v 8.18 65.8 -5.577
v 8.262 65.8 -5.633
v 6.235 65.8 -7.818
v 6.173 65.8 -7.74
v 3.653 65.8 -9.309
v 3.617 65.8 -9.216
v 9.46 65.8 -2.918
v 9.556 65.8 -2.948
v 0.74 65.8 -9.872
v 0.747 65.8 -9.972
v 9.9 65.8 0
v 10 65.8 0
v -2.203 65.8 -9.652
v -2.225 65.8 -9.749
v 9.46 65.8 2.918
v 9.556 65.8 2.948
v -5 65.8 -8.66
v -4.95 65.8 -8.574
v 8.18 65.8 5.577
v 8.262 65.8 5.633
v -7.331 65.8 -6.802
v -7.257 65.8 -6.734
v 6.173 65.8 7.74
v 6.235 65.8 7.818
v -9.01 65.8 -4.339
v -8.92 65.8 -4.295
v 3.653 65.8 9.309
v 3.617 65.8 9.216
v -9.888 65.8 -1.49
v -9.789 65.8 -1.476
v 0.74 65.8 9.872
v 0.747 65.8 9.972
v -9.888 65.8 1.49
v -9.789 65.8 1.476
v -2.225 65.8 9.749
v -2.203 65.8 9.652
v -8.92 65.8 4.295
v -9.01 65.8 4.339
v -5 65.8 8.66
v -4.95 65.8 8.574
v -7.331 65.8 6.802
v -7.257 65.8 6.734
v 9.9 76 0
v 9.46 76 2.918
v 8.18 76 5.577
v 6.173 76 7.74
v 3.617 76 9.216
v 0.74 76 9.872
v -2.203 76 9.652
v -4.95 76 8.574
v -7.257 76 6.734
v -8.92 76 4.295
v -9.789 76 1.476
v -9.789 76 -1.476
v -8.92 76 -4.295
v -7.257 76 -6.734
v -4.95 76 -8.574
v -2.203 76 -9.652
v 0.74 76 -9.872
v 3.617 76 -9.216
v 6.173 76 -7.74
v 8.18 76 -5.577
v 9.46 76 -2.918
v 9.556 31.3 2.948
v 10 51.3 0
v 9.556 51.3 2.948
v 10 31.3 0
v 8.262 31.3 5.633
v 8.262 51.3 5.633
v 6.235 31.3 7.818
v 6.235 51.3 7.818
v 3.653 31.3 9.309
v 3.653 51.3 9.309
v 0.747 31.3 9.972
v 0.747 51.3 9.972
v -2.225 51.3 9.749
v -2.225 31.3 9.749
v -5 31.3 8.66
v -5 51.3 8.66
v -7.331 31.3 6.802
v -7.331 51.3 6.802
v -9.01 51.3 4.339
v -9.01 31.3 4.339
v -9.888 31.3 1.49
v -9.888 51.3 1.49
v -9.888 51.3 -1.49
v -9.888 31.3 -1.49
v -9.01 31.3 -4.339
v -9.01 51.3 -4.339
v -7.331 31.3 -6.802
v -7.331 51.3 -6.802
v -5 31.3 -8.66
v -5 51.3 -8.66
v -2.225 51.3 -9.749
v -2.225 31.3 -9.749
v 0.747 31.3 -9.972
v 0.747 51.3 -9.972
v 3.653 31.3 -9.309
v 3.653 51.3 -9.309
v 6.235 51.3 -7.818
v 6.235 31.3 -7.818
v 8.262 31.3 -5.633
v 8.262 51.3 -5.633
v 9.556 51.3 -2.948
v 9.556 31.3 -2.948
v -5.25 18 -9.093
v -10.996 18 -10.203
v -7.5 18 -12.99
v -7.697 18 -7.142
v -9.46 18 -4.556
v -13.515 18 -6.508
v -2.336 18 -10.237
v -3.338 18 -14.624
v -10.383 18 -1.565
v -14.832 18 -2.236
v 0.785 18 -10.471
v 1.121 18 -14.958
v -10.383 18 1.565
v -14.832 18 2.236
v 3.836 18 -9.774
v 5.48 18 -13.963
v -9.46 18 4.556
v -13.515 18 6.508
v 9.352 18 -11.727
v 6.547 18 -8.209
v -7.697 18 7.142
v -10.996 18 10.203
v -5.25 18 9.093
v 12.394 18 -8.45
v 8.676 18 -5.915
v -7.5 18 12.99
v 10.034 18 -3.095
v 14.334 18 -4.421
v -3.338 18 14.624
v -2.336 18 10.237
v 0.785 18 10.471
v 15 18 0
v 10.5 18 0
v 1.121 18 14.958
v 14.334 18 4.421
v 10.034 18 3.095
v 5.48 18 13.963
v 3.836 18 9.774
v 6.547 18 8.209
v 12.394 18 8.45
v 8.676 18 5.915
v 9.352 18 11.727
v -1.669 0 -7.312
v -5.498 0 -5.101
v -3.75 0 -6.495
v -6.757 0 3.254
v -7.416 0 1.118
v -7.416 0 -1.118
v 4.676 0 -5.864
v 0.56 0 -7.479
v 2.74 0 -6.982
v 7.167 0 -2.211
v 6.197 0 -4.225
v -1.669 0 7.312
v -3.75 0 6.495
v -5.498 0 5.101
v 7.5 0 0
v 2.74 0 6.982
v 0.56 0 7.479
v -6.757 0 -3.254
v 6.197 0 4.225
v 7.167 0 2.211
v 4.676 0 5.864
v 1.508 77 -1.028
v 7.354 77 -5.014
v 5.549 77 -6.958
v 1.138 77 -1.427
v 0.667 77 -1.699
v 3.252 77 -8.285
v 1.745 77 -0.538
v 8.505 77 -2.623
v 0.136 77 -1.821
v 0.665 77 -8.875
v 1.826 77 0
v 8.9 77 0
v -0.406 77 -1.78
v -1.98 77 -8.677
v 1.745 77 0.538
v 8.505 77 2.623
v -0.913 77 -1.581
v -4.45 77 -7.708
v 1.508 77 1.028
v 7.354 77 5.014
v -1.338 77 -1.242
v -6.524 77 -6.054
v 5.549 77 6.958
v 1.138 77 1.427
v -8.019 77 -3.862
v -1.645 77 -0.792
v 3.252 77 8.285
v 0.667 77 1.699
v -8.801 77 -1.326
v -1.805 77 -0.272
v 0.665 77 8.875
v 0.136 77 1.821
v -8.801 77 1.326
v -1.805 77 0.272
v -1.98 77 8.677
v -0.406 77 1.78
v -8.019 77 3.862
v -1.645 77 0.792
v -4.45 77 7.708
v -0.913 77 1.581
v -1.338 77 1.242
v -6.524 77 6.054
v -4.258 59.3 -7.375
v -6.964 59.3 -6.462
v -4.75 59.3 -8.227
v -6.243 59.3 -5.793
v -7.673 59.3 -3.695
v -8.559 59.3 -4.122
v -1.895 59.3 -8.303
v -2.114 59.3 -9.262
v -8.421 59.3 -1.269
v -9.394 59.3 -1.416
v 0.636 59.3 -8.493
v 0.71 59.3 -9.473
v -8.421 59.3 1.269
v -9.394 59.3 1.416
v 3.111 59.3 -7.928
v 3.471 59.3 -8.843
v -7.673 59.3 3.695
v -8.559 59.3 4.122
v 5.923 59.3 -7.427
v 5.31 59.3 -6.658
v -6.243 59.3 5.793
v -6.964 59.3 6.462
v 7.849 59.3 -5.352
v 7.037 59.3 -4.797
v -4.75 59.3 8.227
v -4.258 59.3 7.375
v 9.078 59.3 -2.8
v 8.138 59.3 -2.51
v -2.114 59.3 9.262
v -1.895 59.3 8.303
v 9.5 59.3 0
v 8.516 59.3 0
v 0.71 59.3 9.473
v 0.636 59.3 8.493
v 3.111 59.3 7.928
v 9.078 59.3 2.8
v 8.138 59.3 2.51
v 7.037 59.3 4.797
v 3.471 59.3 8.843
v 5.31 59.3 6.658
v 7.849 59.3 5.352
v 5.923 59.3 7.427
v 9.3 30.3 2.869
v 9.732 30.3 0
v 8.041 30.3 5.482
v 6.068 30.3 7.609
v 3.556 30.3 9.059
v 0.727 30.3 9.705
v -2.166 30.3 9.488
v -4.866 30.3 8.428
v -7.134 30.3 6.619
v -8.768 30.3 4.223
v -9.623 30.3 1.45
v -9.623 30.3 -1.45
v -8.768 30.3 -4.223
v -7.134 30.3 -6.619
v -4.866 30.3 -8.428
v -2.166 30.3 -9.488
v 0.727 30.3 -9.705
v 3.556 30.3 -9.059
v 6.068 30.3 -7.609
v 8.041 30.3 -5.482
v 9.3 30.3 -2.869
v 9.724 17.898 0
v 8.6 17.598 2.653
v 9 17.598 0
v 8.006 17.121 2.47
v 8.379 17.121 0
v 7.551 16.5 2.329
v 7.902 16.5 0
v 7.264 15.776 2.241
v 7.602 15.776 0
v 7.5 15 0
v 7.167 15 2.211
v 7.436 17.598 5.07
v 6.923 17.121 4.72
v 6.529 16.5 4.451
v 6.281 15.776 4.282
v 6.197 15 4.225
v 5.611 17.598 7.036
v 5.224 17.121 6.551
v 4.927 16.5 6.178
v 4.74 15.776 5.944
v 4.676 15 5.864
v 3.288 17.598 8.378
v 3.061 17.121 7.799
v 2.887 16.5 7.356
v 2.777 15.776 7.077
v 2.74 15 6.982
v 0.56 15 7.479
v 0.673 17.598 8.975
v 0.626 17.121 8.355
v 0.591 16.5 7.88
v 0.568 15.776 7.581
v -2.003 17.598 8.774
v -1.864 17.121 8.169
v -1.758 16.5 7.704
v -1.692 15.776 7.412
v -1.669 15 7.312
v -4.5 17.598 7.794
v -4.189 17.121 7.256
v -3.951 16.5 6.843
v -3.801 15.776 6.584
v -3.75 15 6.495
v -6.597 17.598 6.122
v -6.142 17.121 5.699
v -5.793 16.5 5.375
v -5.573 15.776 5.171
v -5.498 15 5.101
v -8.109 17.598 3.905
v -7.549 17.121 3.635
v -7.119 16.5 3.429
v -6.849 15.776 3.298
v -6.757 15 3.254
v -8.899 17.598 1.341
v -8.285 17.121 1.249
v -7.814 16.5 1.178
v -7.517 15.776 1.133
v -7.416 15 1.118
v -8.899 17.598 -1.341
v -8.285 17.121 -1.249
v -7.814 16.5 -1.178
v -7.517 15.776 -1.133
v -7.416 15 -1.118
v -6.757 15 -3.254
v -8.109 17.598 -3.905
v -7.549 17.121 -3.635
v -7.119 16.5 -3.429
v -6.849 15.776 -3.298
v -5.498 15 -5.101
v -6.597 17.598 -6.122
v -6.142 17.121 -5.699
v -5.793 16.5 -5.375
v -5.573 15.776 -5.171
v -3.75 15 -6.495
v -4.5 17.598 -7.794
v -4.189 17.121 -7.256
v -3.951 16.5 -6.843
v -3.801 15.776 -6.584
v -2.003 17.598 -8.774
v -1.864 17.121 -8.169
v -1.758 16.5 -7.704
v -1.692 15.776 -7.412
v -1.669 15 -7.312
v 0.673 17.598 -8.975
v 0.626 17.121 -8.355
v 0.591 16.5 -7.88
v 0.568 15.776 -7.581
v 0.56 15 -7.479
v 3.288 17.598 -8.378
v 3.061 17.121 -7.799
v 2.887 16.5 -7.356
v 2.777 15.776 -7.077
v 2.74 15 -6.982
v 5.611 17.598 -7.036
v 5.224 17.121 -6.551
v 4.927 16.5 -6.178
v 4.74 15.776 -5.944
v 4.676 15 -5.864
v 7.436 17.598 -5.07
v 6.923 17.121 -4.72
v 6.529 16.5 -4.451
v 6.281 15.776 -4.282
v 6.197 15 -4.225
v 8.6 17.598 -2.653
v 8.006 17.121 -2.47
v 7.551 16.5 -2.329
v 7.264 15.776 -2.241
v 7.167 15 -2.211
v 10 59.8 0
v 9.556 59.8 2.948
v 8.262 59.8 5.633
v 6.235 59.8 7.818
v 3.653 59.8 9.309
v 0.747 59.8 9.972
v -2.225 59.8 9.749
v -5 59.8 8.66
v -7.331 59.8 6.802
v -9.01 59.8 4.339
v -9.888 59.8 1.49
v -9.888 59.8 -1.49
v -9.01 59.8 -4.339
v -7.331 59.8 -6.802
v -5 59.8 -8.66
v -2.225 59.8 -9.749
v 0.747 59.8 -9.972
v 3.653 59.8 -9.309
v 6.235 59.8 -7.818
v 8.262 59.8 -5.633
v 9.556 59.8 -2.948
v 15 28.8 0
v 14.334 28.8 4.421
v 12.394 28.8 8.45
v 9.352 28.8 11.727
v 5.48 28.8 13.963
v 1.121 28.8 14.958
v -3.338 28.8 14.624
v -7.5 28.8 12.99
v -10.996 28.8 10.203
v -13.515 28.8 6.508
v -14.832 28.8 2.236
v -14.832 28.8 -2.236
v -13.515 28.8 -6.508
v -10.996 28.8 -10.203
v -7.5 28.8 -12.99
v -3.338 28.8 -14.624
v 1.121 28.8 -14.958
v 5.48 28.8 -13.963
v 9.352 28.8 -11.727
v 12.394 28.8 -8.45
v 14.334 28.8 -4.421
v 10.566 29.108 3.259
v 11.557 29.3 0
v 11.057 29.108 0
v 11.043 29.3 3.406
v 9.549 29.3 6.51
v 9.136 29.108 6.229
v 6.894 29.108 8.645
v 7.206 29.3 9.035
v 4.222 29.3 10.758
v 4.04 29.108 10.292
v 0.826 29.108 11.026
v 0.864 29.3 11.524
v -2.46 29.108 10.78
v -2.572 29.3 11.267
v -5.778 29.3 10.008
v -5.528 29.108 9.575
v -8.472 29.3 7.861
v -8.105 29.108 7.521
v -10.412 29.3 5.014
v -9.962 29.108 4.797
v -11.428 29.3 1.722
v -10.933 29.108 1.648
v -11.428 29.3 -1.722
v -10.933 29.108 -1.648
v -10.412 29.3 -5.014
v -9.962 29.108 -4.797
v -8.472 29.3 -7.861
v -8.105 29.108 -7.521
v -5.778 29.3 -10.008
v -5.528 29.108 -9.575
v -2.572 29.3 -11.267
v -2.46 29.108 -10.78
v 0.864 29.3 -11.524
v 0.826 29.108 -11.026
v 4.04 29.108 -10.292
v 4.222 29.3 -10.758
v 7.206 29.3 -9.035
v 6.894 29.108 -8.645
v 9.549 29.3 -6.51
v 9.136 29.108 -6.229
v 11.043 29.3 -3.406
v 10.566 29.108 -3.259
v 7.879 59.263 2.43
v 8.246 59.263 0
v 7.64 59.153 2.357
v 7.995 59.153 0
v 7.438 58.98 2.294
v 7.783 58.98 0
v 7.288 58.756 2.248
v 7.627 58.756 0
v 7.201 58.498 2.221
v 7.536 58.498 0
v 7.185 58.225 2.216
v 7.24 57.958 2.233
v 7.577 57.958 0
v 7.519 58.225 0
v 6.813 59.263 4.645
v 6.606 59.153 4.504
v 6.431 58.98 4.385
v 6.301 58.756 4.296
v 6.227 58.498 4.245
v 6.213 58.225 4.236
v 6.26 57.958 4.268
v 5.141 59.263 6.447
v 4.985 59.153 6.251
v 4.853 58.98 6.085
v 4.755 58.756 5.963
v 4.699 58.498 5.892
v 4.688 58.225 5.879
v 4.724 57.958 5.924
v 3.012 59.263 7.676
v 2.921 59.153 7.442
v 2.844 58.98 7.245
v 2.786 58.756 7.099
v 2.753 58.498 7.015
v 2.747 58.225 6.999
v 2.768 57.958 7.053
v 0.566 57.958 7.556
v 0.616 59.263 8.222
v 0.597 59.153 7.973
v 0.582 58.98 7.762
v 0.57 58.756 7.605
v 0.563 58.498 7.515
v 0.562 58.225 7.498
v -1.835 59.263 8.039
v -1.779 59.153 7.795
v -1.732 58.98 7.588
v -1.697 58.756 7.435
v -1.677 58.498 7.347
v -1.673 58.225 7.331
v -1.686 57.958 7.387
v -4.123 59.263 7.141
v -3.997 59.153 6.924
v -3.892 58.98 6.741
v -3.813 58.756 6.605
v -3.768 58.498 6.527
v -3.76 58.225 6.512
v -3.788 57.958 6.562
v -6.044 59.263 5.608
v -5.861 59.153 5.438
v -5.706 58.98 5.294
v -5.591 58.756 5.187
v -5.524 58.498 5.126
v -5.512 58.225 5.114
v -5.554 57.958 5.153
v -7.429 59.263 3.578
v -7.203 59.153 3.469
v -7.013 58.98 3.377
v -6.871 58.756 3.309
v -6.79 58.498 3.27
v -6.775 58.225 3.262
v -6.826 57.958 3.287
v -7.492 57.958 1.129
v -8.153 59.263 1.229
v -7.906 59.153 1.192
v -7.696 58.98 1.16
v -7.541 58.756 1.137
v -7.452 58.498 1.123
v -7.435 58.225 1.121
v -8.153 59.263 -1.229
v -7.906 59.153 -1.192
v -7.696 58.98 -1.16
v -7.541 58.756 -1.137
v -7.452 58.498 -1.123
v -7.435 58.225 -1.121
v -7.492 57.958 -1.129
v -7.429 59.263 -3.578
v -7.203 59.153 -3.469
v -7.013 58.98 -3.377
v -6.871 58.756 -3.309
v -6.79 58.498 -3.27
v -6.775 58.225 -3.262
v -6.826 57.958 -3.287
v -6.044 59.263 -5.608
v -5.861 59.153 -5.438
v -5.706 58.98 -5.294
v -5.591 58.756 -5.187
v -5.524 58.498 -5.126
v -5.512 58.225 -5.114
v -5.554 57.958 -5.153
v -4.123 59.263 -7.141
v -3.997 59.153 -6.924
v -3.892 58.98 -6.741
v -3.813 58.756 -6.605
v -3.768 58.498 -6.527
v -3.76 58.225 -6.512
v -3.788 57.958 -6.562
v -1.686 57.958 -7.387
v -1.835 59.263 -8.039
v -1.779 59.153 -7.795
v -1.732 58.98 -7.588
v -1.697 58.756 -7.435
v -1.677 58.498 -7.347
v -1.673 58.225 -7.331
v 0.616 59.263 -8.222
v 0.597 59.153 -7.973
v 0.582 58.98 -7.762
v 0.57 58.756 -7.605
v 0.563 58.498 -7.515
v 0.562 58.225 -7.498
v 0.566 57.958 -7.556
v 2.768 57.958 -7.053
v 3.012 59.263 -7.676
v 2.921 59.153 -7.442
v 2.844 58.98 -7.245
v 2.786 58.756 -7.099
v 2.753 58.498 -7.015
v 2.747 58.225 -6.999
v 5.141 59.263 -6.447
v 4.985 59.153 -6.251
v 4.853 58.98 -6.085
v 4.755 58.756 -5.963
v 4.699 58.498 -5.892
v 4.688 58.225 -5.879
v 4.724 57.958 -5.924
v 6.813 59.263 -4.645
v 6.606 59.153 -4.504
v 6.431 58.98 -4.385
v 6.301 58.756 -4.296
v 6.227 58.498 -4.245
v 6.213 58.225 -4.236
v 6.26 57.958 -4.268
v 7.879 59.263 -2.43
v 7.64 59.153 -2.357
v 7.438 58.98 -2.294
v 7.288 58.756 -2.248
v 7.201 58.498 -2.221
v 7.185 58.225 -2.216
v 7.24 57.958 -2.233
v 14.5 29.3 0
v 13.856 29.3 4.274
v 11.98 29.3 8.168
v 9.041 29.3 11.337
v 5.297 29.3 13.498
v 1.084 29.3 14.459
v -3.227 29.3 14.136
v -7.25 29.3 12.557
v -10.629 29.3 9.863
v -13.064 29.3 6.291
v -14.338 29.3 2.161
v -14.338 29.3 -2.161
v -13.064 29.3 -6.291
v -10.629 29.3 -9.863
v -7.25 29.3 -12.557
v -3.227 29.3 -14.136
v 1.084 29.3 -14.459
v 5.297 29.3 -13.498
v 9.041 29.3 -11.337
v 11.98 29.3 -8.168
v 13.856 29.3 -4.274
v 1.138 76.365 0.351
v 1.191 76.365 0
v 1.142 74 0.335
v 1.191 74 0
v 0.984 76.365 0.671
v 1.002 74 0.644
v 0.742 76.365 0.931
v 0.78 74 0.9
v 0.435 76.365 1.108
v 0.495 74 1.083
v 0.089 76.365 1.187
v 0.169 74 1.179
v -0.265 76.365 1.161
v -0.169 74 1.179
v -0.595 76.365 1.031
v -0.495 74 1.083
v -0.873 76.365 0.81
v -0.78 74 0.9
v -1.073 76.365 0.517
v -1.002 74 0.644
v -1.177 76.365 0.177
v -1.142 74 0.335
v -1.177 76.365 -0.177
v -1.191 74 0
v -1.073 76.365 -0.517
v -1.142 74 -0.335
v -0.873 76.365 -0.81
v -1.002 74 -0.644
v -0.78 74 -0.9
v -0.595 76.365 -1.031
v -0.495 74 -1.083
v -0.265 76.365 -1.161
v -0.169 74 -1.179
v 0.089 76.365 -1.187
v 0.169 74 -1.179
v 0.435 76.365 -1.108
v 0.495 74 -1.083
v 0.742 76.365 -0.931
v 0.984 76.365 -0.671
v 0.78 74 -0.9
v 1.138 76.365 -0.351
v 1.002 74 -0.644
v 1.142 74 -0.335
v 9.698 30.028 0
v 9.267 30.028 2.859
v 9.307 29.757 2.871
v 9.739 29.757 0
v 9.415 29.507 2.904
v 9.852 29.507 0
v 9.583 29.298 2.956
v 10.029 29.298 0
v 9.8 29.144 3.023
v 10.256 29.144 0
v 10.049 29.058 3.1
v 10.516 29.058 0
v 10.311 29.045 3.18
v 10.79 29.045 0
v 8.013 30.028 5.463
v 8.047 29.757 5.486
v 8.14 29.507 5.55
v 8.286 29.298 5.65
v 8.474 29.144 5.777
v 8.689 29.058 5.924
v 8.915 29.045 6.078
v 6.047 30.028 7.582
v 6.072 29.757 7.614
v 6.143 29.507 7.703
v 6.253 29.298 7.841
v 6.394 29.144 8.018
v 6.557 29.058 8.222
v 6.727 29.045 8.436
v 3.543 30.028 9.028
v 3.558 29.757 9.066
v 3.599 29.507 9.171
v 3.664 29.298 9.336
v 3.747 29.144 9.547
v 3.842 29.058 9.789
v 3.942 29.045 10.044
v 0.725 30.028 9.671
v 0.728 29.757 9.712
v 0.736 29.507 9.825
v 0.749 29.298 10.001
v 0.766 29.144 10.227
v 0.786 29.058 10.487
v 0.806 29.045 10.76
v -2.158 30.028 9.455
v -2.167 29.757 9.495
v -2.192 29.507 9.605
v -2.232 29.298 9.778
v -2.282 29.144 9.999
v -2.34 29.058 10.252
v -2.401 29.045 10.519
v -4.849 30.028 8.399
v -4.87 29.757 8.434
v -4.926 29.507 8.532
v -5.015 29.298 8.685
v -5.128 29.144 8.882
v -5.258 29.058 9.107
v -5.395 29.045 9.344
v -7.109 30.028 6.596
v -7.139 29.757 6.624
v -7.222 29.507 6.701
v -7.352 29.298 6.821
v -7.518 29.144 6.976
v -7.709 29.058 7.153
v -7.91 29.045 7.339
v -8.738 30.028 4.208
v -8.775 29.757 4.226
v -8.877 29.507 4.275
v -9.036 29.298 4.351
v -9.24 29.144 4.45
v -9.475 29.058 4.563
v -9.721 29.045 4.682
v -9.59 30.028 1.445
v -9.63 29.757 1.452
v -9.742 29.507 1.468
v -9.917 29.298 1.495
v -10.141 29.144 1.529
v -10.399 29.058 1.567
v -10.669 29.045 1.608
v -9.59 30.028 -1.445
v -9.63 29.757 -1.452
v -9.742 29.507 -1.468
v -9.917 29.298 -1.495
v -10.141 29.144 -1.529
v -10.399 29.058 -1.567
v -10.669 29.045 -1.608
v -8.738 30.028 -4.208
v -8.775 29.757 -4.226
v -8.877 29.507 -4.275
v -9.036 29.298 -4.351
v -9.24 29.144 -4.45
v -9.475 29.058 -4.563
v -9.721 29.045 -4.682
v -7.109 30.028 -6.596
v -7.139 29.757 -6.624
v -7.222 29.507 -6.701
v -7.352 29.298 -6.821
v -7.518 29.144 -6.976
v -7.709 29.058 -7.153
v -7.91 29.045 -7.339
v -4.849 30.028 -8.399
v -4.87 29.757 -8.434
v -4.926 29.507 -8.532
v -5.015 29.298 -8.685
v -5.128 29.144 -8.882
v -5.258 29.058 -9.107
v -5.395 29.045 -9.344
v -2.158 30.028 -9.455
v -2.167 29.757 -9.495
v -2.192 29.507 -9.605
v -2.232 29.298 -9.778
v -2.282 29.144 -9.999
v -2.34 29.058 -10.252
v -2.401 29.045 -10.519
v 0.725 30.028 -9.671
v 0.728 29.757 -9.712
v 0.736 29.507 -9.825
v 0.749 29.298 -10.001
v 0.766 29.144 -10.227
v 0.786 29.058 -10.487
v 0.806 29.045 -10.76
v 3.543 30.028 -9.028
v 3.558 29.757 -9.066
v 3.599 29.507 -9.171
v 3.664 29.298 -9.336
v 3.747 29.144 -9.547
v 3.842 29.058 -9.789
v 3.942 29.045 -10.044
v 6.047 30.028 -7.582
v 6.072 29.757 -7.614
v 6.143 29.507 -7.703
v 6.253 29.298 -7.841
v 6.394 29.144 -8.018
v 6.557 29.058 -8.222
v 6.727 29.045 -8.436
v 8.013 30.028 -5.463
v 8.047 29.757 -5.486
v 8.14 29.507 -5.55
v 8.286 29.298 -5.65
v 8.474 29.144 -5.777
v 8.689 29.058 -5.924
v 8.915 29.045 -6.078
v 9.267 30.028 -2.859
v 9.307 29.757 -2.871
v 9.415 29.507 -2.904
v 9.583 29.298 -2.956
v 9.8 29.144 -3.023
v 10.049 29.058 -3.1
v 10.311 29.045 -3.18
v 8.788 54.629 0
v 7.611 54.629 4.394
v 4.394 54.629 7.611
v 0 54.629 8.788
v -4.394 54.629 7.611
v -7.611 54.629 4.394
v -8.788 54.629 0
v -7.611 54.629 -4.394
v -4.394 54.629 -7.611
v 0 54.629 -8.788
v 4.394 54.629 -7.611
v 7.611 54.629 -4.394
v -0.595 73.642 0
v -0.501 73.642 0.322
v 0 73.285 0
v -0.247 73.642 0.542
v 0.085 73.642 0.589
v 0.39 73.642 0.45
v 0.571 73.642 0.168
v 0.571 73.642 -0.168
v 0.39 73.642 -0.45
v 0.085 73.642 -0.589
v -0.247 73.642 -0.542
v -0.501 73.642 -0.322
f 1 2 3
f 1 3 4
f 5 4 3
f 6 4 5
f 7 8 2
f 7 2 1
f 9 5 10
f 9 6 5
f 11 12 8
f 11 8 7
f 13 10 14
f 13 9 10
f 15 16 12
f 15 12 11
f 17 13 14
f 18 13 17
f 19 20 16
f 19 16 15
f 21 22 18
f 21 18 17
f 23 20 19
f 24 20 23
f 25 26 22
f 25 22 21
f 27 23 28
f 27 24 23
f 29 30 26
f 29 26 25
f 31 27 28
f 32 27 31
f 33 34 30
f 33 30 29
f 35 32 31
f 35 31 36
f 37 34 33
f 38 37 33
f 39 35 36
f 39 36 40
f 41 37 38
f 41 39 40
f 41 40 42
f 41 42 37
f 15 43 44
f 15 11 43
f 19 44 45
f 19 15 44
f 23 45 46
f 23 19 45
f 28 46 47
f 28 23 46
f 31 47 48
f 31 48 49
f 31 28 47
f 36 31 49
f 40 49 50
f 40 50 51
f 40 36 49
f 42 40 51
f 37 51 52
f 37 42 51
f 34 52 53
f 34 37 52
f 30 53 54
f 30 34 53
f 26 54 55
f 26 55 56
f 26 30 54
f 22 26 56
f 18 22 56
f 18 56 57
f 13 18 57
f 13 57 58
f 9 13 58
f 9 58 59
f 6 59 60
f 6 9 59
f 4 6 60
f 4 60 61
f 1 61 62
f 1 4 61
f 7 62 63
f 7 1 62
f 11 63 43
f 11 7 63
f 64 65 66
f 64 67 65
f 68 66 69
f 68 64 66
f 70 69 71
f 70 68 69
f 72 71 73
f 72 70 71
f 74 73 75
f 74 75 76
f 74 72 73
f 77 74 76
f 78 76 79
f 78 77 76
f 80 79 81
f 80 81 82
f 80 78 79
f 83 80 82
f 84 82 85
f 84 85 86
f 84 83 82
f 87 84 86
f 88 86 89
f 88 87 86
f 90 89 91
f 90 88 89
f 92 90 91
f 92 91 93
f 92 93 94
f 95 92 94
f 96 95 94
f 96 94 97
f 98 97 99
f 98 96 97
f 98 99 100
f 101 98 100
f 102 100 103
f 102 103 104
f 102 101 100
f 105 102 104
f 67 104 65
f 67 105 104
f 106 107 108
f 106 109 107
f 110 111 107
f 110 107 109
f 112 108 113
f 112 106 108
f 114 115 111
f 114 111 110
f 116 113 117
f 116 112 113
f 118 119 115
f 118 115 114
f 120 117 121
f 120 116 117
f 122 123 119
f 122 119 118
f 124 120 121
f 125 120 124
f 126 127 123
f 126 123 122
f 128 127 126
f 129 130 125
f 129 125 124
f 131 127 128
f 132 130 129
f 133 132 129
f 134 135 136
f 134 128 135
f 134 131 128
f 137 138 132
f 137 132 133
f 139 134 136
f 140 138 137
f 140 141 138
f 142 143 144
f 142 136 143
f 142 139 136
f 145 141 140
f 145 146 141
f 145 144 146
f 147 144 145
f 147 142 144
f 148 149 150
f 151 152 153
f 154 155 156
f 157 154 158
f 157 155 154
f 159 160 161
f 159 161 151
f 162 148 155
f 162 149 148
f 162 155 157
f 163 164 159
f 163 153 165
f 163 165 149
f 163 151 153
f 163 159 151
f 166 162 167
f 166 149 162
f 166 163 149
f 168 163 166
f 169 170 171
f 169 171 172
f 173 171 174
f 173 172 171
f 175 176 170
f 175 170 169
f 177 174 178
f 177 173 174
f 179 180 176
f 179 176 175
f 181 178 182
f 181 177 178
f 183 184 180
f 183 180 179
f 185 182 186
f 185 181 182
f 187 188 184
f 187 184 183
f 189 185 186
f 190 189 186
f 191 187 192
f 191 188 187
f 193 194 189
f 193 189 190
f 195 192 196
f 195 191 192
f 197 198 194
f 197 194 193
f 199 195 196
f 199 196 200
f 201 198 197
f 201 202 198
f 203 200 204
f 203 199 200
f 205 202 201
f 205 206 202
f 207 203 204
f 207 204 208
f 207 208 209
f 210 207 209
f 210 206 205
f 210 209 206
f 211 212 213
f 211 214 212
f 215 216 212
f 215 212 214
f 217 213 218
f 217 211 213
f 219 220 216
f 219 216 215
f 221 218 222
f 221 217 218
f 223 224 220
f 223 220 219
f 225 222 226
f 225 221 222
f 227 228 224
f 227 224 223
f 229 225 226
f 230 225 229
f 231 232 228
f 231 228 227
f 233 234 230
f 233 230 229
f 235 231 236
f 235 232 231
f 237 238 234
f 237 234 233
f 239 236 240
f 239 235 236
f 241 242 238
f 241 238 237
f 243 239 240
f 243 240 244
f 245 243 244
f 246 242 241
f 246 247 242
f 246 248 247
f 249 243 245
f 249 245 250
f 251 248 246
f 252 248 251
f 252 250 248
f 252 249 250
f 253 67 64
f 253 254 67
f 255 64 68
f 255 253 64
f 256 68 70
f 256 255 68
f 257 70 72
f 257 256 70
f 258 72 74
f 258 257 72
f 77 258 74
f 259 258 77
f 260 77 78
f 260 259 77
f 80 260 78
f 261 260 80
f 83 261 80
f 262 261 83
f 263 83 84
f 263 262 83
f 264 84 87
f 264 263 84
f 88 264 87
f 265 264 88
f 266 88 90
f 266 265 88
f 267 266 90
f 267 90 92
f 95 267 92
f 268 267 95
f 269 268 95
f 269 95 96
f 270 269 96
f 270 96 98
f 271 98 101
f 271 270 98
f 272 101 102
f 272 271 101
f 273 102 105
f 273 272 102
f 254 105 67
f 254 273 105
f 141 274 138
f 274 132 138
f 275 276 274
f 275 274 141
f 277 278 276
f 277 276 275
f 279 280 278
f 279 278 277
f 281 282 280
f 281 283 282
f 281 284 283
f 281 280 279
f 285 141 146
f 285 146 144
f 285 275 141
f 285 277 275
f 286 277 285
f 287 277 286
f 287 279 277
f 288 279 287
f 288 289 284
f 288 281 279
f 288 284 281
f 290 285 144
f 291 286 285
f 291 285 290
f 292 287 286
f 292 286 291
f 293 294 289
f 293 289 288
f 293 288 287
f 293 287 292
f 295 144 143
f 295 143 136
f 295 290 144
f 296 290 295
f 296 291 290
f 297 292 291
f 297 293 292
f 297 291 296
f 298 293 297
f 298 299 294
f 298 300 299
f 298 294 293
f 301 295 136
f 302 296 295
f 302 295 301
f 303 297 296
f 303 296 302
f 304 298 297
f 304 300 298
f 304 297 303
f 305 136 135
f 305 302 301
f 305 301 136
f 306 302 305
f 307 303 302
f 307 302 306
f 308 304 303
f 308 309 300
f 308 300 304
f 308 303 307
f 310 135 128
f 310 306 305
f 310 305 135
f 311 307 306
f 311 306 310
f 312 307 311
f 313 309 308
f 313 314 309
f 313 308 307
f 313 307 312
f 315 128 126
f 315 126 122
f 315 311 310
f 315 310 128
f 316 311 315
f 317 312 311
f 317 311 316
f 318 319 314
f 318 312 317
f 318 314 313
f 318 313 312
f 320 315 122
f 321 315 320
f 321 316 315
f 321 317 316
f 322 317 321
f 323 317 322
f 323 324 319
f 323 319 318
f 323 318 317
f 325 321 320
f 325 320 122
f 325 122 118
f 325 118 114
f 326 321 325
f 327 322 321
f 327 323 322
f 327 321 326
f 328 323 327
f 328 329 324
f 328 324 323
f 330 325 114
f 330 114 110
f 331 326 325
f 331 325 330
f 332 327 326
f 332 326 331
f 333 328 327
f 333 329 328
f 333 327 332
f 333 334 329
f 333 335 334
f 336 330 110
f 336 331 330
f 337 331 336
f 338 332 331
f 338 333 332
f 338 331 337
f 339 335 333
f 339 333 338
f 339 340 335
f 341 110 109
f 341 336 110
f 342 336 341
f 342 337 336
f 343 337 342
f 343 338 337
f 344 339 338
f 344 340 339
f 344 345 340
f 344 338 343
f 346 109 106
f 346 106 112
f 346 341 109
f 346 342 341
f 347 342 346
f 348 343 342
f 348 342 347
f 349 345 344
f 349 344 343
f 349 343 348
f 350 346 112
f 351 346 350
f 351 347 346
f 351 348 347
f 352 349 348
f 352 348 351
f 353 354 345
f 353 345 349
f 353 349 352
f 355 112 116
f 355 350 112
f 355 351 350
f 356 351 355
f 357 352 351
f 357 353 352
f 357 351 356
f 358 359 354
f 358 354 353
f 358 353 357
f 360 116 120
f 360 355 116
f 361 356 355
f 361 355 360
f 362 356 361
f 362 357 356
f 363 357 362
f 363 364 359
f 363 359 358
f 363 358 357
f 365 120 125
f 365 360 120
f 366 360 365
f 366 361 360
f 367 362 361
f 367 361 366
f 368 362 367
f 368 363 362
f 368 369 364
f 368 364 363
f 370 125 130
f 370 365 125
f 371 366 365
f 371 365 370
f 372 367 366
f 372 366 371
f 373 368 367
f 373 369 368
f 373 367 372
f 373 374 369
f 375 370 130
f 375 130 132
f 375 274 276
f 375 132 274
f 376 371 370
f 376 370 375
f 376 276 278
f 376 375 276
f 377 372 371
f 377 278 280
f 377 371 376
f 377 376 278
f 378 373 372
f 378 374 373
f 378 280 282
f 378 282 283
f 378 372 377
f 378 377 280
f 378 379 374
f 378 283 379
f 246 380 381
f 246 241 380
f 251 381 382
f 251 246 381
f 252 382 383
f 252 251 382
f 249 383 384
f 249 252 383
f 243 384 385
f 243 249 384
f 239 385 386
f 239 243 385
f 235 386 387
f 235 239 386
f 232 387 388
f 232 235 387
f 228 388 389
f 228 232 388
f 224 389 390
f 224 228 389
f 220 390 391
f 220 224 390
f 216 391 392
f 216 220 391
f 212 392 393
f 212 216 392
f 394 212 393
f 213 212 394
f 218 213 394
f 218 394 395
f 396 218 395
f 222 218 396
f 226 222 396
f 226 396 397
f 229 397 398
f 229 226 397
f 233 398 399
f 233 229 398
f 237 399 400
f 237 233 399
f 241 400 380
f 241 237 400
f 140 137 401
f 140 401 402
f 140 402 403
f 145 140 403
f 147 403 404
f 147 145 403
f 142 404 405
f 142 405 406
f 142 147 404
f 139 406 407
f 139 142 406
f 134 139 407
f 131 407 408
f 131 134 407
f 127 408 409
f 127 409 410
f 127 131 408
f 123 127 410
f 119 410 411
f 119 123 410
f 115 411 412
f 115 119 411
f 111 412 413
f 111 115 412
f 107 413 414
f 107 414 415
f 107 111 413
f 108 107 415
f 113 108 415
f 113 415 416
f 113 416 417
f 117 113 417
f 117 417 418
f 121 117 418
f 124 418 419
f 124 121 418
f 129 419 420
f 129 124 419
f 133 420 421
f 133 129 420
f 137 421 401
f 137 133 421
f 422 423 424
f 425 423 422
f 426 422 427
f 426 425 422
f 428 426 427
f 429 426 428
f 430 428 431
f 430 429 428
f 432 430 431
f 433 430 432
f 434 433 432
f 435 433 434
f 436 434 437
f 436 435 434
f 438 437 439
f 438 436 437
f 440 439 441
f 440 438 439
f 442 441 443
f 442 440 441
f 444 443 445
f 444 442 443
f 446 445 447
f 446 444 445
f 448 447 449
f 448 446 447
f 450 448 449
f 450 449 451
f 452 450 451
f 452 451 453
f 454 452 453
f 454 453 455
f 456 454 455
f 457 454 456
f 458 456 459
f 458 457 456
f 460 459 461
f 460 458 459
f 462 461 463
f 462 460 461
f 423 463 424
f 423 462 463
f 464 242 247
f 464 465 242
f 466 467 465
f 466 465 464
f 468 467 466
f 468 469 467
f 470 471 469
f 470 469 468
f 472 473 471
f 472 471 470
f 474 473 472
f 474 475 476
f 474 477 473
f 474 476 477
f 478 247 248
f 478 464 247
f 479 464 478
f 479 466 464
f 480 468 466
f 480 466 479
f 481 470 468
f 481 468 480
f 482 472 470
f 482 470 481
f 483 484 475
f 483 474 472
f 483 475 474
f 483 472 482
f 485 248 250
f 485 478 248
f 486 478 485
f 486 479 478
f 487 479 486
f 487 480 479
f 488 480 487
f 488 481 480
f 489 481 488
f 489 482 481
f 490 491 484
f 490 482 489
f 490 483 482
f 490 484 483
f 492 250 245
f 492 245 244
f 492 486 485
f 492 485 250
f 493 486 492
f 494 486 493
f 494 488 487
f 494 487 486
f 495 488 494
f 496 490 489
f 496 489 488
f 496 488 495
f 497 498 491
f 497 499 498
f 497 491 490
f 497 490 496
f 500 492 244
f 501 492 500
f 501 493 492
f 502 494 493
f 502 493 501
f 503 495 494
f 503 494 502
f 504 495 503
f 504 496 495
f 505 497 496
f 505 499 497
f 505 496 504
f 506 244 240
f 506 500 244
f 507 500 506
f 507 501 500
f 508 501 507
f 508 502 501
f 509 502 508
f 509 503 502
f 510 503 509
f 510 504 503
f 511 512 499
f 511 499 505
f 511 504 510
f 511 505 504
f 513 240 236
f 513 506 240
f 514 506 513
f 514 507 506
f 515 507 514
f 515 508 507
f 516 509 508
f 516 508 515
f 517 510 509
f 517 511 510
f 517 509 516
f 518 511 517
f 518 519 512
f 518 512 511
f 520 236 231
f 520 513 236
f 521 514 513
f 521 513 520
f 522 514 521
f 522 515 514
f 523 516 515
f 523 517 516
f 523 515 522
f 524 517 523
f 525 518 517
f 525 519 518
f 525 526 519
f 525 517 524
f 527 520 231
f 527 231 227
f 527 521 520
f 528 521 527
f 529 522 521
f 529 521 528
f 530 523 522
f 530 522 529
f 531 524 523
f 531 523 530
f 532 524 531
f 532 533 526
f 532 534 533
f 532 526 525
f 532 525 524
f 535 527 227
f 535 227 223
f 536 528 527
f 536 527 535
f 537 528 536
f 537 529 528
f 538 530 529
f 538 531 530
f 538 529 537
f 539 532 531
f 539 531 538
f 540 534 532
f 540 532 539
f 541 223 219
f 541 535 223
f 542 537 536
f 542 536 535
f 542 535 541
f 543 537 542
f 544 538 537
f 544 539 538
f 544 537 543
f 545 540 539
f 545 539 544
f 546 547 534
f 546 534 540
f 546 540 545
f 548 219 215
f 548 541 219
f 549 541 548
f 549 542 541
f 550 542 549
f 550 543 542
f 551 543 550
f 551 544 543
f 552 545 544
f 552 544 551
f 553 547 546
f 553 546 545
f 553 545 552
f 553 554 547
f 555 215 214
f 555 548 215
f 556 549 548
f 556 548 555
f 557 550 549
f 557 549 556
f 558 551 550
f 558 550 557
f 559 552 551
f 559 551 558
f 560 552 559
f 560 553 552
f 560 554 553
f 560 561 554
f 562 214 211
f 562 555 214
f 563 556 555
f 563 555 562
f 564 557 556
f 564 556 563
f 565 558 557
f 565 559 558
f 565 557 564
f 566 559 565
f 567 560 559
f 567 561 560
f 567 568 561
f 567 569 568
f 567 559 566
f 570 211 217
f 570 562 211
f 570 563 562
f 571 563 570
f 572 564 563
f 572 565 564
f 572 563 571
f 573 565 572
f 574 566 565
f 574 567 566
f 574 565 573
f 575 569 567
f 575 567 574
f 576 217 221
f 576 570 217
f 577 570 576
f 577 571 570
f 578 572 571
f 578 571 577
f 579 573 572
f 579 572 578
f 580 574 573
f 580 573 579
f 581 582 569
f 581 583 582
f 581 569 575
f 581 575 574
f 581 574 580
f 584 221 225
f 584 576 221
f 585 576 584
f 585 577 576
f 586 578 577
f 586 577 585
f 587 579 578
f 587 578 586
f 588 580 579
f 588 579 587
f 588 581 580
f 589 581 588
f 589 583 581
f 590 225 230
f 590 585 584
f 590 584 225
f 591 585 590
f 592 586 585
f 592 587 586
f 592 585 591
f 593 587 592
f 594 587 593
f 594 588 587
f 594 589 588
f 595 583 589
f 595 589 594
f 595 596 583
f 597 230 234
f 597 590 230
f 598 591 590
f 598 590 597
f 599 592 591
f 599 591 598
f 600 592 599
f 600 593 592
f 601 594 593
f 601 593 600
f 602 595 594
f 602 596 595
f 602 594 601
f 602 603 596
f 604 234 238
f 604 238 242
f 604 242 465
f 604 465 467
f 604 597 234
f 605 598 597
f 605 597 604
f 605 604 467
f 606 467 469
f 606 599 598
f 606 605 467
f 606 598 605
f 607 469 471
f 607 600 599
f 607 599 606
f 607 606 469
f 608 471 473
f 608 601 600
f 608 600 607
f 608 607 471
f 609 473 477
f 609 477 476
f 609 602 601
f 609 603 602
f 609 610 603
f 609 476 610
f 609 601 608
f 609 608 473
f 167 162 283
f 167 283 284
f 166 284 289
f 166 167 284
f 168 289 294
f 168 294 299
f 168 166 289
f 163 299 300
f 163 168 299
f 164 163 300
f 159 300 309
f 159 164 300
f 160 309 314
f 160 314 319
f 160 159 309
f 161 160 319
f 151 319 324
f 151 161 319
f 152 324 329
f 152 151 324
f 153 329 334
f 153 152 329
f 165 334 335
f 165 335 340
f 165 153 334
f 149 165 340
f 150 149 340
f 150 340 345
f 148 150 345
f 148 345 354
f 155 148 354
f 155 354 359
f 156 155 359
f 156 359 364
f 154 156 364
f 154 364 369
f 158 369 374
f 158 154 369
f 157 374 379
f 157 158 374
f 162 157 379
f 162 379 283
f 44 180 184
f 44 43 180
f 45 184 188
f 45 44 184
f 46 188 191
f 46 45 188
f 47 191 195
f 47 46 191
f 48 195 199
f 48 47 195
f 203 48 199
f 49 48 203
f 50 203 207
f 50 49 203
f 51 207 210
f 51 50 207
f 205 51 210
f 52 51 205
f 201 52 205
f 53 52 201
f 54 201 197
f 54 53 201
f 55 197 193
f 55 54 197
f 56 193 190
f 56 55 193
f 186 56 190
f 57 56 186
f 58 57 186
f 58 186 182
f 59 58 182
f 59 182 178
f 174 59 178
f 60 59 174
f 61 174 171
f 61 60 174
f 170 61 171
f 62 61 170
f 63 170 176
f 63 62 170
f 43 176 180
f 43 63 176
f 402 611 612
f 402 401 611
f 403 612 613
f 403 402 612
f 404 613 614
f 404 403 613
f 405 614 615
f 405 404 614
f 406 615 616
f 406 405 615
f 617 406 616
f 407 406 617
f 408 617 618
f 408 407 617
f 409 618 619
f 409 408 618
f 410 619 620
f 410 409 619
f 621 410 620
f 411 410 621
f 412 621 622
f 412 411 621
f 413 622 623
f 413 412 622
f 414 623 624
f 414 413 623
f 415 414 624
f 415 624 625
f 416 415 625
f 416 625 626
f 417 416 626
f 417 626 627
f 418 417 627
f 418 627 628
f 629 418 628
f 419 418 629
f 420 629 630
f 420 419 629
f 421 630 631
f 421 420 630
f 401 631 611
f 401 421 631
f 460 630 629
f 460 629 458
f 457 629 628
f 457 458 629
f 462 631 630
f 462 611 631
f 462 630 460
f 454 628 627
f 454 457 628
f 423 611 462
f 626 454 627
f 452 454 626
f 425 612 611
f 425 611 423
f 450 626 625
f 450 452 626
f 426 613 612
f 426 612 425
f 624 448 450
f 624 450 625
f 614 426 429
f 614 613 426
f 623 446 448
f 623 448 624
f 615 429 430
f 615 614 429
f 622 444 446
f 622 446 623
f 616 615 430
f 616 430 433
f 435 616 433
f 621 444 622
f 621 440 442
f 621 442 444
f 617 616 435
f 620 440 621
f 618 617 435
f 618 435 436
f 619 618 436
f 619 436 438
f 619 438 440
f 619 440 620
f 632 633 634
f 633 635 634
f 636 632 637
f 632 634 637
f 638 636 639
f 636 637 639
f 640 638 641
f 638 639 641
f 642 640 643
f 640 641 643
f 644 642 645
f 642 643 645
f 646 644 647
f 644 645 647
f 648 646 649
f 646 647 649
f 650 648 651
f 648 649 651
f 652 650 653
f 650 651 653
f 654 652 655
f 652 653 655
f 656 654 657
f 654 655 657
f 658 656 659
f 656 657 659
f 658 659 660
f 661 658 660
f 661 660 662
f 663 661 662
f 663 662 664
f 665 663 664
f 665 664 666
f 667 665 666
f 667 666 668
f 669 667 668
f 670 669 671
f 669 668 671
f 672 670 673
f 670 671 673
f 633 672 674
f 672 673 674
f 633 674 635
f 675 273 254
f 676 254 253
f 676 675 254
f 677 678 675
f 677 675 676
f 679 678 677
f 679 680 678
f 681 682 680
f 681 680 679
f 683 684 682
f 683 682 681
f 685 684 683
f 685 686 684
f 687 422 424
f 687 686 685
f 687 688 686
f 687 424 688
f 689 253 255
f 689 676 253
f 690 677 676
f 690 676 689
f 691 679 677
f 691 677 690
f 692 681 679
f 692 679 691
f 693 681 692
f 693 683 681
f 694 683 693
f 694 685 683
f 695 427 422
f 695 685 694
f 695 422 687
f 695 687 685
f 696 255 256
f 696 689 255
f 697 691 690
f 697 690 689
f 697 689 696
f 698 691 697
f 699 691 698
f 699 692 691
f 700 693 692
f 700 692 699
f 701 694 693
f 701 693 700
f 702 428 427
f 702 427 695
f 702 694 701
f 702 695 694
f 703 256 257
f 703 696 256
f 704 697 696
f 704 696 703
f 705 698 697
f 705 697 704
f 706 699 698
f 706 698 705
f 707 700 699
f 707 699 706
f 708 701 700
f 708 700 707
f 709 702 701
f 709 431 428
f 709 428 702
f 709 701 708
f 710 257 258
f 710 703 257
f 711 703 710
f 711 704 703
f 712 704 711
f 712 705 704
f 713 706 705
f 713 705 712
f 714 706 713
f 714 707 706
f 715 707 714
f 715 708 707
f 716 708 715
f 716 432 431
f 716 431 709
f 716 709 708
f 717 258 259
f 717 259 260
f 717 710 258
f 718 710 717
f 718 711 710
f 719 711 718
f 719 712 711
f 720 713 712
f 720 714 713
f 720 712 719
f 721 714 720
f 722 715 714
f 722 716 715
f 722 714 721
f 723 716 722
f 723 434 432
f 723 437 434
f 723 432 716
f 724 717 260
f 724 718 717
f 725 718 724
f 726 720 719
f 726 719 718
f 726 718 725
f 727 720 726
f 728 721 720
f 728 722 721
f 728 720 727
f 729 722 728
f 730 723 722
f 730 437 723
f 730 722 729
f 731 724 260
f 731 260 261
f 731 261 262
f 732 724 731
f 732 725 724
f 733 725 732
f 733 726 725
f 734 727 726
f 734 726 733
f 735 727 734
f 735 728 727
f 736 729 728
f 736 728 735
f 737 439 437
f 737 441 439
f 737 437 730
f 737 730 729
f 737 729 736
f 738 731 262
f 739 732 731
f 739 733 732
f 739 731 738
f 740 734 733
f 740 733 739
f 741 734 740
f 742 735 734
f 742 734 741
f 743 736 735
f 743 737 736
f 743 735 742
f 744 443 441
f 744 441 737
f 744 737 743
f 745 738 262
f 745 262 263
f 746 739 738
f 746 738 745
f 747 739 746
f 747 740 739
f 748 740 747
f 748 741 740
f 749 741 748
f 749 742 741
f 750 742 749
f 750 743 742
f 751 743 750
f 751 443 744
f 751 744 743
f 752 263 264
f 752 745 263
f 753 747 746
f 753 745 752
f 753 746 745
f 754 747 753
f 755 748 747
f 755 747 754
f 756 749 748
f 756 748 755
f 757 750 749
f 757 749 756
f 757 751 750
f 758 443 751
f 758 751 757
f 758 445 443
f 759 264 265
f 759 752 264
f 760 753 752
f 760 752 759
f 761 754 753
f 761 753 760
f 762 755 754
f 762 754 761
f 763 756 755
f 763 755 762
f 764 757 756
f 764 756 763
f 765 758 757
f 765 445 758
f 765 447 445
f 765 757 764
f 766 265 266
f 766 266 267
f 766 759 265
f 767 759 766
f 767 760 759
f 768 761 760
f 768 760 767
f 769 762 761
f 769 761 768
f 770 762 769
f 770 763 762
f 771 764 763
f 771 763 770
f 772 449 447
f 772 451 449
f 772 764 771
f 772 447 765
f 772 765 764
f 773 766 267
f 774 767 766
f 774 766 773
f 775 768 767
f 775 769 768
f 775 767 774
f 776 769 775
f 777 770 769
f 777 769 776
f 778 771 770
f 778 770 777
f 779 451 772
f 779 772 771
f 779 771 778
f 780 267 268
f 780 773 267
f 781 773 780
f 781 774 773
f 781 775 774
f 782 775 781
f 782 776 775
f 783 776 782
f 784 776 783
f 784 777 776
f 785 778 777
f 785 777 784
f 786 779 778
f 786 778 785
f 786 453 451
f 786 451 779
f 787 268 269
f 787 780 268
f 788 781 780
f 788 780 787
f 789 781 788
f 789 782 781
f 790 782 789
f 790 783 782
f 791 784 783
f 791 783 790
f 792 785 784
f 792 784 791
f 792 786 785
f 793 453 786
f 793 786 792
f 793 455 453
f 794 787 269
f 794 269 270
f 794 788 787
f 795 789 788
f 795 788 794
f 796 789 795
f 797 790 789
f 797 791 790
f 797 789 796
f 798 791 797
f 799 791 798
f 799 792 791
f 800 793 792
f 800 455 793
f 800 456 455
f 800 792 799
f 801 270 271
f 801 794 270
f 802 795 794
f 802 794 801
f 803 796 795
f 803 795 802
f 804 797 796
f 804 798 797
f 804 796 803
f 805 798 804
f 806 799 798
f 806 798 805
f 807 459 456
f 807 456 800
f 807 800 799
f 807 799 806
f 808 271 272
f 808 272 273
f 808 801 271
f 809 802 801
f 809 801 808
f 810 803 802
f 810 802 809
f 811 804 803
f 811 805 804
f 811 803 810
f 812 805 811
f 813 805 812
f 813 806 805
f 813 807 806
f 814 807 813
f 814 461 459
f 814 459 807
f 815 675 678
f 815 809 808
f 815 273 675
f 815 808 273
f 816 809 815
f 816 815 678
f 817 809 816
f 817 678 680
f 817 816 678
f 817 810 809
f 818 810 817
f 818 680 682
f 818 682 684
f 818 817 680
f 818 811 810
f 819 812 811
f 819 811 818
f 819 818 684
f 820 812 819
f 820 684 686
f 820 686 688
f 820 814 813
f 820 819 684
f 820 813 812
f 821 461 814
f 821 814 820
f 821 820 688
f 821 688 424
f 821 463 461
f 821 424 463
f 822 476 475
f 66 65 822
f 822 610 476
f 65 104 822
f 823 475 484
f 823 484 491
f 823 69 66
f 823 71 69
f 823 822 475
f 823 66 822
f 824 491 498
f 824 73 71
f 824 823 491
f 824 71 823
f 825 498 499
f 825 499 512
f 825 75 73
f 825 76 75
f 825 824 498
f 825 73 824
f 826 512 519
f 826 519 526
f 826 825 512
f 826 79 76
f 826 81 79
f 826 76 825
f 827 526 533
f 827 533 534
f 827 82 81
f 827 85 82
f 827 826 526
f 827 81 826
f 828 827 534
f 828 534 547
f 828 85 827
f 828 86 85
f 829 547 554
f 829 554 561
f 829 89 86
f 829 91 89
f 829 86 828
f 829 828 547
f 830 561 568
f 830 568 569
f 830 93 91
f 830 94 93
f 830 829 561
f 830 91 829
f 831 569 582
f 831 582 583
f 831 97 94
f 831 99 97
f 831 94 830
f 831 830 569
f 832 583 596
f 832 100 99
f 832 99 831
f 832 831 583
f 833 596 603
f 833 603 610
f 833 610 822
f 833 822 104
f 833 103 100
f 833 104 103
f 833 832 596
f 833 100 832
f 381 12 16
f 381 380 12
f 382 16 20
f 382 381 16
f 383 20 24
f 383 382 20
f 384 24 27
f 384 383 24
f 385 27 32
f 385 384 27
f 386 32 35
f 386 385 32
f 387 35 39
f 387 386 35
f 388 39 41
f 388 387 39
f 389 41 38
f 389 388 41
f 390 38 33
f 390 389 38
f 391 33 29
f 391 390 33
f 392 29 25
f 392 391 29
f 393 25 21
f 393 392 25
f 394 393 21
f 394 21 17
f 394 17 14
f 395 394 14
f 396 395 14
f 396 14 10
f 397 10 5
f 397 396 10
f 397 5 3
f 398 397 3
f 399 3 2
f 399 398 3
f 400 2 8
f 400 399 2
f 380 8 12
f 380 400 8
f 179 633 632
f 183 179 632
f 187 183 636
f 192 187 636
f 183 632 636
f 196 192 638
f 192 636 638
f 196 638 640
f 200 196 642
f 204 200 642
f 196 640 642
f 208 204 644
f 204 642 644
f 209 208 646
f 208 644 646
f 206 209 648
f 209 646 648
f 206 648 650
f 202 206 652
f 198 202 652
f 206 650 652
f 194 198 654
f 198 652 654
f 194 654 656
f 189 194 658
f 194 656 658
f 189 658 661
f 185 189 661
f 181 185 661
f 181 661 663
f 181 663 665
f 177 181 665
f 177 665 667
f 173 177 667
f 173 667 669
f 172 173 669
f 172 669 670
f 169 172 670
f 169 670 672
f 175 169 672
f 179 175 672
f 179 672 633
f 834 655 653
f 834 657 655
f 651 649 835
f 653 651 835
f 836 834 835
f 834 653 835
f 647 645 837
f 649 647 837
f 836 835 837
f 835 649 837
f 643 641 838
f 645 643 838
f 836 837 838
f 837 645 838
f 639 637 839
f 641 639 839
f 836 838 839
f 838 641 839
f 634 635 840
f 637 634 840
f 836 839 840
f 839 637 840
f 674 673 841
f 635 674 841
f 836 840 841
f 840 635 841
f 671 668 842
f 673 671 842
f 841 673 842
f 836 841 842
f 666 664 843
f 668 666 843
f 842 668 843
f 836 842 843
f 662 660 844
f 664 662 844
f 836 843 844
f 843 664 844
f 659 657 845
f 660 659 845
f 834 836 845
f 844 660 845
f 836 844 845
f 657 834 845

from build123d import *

# Parameters (mm, degrees)
FURO_DE_DI_METRO_3_32_0_09375_2_D           = 2.38125
FURO_DE_DI_METRO_3_32_0_09375_2_DEPTH       = 3
FURO_DE_DI_METRO_3_32_0_09375_2_CSINK_D     = 3.65125
FURO_DE_DI_METRO_3_32_0_09375_2_CSINK_ANGLE = 90
FURO_DE_DI_METRO_3_32_0_09375_2_TIP         = 0.715399675
ESBO_O10_OUTSIDE_W                          = 49.582
ESBO_O10_OUTSIDE_H                          = 49.582
ESBO_O10_OUTSIDE_R                          = 7.5
CORTE_EXTRUS_O2_DEPTH                       = 18
FILETE1_R                                   = 3


with BuildPart() as part:
    # Esboço1 → Revolução1 (revolve)
    with BuildSketch(Plane.XY):
        with BuildLine():
            Line((0, 77), (8.9, 77))
            Line((8.9, 77), (9.9, 76))
            Line((9.9, 76), (9.9, 65.8))
            Line((9.9, 65.8), (10, 65.8))
            Line((10, 65.8), (10, 59.8))
            Line((10, 59.8), (9.5, 59.3))
            Line((9.5, 59.3), (8.516386133, 59.3))
            ThreePointArc((8.516386133, 59.3), (7.697234088, 58.873576436), (7.576693512, 57.957979857))
            Line((7.576693512, 57.957979857), (10, 51.3))
            Line((10, 51.3), (10, 31.3))
            Line((10, 31.3), (9.732050808, 30.3))
            ThreePointArc((9.732050808, 30.3), (10.029032337, 29.297868418), (11.05681259, 29.107780314))
            Line((11.05681259, 29.107780314), (11.55681259, 29.3))
            Line((11.55681259, 29.3), (14.5, 29.3))
            Line((14.5, 29.3), (15, 28.8))
            Line((15, 28.8), (15, 0))
            Line((15, 0), (0, 0))
            Line((0, 0), (0, 77))
        make_face()
    revolve(axis=Axis((0, 77, 0), (0, -1, 0)))

    # Furo de diâmetro 3/32 (0.09375)2
    with Locations(Plane(origin=(0, 77, 0), x_dir=(-1, 0, 0), z_dir=(0, 1, 0))):
        with Locations((0, 0)):
            CounterSinkHole(FURO_DE_DI_METRO_3_32_0_09375_2_D / 2, FURO_DE_DI_METRO_3_32_0_09375_2_CSINK_D / 2, depth=FURO_DE_DI_METRO_3_32_0_09375_2_DEPTH, counter_sink_angle=FURO_DE_DI_METRO_3_32_0_09375_2_CSINK_ANGLE)
            with Locations((0, 0, -(FURO_DE_DI_METRO_3_32_0_09375_2_DEPTH + FURO_DE_DI_METRO_3_32_0_09375_2_TIP / 2))):  # 118° drill point
                Cone(0, FURO_DE_DI_METRO_3_32_0_09375_2_D / 2, FURO_DE_DI_METRO_3_32_0_09375_2_TIP, mode=Mode.SUBTRACT)

    # Esboço10 outside → Corte-extrusão2 (cut)
    with BuildSketch(Plane.XZ):
        Rectangle(ESBO_O10_OUTSIDE_W, ESBO_O10_OUTSIDE_H)
        Circle(ESBO_O10_OUTSIDE_R, mode=Mode.SUBTRACT)
    extrude(amount=-CORTE_EXTRUS_O2_DEPTH, mode=Mode.SUBTRACT)

    # Filete1
    filete1_edges = [part.edges().sort_by_distance(p)[0] for p in [
        (-7.5, 18, 0),
    ]]
    fillet(filete1_edges, radius=FILETE1_R)


solid = part.part
